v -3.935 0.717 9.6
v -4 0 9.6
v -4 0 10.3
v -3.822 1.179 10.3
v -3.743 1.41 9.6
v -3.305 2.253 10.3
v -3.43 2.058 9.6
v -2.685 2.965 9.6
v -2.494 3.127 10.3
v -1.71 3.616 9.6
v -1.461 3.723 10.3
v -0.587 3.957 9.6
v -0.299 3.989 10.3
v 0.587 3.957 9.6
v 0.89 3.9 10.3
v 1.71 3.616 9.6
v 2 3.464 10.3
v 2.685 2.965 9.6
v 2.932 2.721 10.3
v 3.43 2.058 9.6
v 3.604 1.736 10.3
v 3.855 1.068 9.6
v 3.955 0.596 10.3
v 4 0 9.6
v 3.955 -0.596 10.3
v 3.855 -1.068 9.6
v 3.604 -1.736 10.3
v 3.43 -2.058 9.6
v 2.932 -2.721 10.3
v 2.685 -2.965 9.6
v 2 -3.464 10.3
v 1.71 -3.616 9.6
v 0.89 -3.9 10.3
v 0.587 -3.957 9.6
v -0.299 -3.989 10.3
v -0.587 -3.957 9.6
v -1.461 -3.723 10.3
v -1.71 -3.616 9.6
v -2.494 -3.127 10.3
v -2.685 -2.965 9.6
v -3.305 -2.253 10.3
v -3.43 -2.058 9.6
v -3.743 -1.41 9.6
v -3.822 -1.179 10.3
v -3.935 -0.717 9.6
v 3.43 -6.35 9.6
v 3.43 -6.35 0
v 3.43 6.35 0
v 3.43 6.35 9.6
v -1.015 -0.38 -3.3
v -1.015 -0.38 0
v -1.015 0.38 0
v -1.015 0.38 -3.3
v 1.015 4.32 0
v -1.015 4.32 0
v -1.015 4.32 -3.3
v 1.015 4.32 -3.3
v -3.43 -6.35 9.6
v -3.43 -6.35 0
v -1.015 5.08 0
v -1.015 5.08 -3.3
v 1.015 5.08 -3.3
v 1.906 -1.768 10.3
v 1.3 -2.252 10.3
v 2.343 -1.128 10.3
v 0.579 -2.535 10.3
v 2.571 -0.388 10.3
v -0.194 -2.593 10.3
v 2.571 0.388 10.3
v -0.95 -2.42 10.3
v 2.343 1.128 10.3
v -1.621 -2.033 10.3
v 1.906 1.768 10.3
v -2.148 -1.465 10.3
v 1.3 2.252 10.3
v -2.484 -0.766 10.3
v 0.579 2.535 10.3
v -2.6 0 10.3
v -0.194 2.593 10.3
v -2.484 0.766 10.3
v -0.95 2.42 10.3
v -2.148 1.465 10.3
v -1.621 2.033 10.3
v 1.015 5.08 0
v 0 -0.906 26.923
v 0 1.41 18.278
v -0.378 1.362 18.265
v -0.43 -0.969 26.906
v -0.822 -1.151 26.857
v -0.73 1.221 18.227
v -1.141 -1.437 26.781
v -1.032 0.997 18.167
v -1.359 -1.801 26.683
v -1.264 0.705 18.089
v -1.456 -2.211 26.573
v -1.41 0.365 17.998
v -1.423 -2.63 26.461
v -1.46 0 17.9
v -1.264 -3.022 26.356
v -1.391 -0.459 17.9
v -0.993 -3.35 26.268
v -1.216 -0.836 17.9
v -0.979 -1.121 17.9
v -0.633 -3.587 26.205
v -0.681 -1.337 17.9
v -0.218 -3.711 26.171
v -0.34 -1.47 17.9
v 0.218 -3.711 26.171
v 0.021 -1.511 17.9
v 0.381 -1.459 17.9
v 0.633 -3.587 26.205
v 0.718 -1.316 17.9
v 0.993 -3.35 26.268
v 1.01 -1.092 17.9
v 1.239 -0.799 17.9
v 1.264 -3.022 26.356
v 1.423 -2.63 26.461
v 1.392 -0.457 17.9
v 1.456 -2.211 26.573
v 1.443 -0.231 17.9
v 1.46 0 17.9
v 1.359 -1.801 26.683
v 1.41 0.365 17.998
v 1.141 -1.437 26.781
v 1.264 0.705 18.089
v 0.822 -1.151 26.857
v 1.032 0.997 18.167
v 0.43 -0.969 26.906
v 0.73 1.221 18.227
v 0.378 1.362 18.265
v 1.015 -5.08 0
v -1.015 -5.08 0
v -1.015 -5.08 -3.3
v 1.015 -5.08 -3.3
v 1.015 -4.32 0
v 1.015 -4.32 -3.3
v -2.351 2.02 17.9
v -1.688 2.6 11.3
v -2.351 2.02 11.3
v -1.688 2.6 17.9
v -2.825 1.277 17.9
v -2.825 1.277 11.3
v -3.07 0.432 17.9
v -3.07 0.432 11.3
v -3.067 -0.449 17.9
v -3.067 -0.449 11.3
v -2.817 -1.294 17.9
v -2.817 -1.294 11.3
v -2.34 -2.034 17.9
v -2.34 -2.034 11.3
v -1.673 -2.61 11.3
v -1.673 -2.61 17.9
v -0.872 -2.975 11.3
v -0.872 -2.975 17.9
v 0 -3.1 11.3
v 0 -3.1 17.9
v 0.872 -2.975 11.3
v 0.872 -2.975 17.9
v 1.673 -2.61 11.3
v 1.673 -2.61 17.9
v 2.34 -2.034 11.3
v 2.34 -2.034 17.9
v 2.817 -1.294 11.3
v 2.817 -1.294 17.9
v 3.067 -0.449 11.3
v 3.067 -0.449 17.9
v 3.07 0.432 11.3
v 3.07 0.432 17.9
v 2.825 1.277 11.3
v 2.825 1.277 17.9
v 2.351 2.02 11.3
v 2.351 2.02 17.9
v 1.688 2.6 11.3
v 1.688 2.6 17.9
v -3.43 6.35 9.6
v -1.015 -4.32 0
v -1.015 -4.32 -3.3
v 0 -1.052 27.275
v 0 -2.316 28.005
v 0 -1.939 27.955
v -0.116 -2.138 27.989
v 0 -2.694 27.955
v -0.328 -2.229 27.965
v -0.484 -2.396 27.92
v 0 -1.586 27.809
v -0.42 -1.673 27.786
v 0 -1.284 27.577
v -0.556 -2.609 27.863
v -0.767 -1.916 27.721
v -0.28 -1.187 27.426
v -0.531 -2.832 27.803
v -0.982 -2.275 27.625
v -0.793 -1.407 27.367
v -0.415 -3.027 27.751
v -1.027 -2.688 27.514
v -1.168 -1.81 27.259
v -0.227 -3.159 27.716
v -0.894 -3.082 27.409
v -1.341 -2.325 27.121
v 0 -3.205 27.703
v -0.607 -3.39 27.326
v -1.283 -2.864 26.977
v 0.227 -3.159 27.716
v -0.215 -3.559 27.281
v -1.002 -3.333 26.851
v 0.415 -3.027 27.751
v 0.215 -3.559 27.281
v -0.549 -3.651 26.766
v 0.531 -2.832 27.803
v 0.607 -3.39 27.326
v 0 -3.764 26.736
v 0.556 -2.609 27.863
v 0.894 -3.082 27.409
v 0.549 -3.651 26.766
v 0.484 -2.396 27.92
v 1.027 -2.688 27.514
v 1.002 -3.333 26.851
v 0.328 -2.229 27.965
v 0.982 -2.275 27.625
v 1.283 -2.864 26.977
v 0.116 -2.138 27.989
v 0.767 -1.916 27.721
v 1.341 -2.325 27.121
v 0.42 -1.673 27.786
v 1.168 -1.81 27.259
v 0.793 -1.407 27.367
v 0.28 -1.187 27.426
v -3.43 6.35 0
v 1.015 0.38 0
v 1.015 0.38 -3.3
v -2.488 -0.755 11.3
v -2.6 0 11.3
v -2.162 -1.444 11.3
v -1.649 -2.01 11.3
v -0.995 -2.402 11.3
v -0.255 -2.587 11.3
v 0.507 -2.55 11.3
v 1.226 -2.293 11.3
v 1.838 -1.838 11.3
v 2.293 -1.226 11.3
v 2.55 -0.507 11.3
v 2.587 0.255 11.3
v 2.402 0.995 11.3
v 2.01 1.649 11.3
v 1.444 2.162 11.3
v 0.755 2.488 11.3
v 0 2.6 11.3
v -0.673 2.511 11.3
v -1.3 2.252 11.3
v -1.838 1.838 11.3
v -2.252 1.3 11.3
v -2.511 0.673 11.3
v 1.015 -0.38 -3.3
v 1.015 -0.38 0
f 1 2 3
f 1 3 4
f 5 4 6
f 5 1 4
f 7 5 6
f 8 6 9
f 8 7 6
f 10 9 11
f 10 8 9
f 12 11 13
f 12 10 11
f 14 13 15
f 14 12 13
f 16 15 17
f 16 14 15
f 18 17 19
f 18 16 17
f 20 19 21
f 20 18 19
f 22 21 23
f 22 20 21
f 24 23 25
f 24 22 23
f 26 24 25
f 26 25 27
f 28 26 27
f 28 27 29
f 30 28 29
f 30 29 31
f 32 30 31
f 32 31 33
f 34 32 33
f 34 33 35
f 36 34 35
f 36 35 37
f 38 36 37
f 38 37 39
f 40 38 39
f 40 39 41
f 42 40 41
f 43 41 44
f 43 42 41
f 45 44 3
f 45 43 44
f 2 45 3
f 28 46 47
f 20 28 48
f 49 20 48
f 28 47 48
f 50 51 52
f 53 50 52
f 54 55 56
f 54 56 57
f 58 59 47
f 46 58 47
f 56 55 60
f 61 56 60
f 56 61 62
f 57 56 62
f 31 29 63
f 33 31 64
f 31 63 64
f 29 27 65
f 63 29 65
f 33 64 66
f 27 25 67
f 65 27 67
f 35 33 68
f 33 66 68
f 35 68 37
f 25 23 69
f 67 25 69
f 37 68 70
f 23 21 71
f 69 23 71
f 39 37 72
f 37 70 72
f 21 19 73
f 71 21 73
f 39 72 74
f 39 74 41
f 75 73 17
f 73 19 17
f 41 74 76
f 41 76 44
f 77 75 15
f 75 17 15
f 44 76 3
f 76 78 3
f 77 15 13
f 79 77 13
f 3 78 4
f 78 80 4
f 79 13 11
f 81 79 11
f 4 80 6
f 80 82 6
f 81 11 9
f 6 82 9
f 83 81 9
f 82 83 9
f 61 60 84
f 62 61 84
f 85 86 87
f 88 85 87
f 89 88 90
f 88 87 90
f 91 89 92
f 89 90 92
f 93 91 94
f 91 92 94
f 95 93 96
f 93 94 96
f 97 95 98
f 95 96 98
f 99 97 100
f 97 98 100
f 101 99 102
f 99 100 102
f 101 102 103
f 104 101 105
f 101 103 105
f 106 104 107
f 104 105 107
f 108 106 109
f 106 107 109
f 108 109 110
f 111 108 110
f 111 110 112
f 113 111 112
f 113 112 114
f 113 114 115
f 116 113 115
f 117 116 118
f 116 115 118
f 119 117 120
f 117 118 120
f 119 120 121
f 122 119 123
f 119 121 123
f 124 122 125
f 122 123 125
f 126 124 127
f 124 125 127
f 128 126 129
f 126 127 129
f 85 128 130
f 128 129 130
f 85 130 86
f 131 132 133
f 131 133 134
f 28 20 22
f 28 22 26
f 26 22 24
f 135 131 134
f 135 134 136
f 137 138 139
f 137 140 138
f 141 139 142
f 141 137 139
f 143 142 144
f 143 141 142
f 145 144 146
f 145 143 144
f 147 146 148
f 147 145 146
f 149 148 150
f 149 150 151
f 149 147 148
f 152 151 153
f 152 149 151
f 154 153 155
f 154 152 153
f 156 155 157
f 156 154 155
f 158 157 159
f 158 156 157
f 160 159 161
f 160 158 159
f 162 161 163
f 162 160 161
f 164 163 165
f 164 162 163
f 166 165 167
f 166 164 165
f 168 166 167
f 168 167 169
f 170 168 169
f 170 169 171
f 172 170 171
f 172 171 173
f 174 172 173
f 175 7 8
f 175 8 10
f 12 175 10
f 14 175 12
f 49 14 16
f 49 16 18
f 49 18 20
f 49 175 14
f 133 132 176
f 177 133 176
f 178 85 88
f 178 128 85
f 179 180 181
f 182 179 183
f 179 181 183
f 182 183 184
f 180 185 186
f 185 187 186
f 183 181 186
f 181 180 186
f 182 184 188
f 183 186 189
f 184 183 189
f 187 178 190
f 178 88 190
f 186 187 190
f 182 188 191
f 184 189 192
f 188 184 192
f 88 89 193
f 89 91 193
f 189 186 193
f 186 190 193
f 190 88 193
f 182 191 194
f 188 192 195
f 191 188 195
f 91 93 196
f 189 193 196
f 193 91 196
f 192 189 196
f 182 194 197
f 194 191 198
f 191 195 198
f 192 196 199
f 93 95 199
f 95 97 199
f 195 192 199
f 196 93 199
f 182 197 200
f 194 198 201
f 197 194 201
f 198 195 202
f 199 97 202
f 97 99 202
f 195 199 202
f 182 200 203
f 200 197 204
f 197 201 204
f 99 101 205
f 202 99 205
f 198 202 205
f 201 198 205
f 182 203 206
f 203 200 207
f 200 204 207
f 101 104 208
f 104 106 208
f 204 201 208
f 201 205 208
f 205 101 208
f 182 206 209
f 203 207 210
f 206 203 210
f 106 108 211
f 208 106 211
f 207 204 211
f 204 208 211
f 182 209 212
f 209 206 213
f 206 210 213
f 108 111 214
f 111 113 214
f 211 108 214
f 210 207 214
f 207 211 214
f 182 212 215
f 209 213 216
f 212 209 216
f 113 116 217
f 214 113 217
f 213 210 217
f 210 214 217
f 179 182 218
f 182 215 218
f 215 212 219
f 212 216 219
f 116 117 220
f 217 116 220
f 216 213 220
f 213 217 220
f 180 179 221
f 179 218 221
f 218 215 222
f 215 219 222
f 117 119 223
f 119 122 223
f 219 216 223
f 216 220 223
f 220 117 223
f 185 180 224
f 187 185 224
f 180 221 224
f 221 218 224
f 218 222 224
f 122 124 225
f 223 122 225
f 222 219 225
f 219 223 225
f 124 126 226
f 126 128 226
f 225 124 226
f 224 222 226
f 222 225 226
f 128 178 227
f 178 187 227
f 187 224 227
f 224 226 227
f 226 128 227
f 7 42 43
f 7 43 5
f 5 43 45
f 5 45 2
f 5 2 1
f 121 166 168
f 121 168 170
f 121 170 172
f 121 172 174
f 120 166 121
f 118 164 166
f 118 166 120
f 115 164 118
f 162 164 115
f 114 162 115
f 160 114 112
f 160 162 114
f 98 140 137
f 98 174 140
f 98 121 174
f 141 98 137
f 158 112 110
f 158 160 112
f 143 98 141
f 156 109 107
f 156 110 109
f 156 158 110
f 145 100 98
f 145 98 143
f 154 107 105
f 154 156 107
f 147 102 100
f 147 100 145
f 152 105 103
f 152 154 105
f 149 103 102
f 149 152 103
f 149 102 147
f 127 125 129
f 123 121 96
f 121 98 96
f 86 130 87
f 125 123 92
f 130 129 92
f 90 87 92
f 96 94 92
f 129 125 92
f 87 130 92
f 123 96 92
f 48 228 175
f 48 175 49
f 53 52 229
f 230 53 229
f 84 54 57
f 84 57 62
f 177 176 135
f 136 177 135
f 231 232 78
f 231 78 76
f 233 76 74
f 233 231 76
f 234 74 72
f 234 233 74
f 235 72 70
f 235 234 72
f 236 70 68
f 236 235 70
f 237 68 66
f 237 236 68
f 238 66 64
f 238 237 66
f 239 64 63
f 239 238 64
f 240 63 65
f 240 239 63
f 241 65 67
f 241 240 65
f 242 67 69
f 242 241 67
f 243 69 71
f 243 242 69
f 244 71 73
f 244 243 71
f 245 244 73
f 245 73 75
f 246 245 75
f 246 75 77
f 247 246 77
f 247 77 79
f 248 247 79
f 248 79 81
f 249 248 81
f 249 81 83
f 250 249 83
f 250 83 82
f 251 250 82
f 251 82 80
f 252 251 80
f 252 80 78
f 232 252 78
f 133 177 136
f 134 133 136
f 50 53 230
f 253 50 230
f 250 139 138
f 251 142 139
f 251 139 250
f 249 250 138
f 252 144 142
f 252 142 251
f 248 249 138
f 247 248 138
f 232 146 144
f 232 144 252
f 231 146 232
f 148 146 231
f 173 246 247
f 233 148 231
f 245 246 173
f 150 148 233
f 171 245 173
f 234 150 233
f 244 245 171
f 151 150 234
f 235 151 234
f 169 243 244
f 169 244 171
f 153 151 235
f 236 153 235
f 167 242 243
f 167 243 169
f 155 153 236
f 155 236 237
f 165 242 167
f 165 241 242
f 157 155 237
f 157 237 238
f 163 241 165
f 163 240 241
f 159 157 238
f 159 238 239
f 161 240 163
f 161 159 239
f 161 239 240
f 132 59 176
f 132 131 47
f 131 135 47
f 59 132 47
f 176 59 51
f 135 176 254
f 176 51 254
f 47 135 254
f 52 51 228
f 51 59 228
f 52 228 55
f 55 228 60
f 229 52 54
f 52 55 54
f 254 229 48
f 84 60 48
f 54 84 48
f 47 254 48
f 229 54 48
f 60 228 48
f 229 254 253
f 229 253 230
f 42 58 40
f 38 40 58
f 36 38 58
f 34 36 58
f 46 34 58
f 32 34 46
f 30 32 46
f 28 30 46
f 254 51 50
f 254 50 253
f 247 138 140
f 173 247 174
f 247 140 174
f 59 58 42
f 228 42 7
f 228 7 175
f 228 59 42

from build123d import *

# Parameters (mm, degrees)
ESQUISSE1_W         = 6.86
ESQUISSE1_H         = 12.7
BOSS_EXTRU_1_DEPTH  = 9.6
SKETCH1_R           = 4
BOSS_EXTRUDE1_DEPTH = 0.7
ESQUISSE4_W         = 2.03
ESQUISSE4_H         = 0.76
BOSS_EXTRU_3_DEPTH  = 3.3
SKETCH3_W           = 6.833076834
SKETCH3_H           = 2.902220806
CUT_EXTRUDE1_DEPTH  = 7.6


with BuildPart() as part:
    # Esquisse1 → Boss.-Extru.1 (new body)
    with BuildSketch(Plane.XY):
        Rectangle(ESQUISSE1_W, ESQUISSE1_H)
    extrude(amount=BOSS_EXTRU_1_DEPTH)

    # Sketch1 → Boss-Extrude1 (add)
    with BuildSketch(Plane(origin=(0, 0, 9.6), x_dir=(-1, 0, 0), z_dir=(0, 0, -1))):
        Circle(SKETCH1_R)
    extrude(amount=-BOSS_EXTRUDE1_DEPTH)

    # Sketch2 → Revolve1 (revolve)
    with BuildSketch(Plane(origin=(0, 0, 0), x_dir=(0, 0, -1), z_dir=(1, 0, 0)), mode=Mode.PRIVATE) as revolve1_sk:
        Polygon((-10.3, 2.6), (-11.3, 2.6), (-11.3, 3.1), (-17.9, 3.1), (-17.9, 0), (-10.3, 0), align=None)
    revolve(revolve1_sk.sketch.rotate(Axis((0, 0, 0), (0, 0, 1)), 90), axis=Axis((0, 0, 0), (0, 0, 1)))

    # Esquisse3 → Révolution1 (revolve)
    with BuildSketch(Plane(origin=(0, 0, 0), x_dir=(0, 0, -1), z_dir=(1, 0, 0))):
        with BuildLine():
            Line((-26.922911951, -0.906178747), (-18.277875806, 1.410251706))
            Line((-18.277875806, 1.410251706), (-17.9, 0))
            Line((-17.9, 0), (-27.955287852, -2.69430626))
            ThreePointArc((-27.955287852, -2.69430626), (-27.809433235, -1.586430454), (-26.922911951, -0.906178747))
        make_face()
    revolve(axis=Axis((0, 0, 17.9), (0, -0.2588190451025217, 0.9659258262890681)))

    # Esquisse4 → Boss.-Extru.3 (add)
    with BuildSketch(Plane.XY):
        Rectangle(ESQUISSE4_W, ESQUISSE4_H)
        with Locations((0, 4.7)):
            Rectangle(ESQUISSE4_W, ESQUISSE4_H)
        with Locations((0, -4.7)):
            Rectangle(ESQUISSE4_W, ESQUISSE4_H)
    extrude(amount=-BOSS_EXTRU_3_DEPTH)

    # Sketch3 → Cut-Extrude1 (cut)
    with BuildSketch(Plane.XY.offset(17.9)):
        with Locations((0.232667491, 4.051110403)):
            Rectangle(SKETCH3_W, SKETCH3_H)
    extrude(amount=-CUT_EXTRUDE1_DEPTH, mode=Mode.SUBTRACT)


solid = part.part
